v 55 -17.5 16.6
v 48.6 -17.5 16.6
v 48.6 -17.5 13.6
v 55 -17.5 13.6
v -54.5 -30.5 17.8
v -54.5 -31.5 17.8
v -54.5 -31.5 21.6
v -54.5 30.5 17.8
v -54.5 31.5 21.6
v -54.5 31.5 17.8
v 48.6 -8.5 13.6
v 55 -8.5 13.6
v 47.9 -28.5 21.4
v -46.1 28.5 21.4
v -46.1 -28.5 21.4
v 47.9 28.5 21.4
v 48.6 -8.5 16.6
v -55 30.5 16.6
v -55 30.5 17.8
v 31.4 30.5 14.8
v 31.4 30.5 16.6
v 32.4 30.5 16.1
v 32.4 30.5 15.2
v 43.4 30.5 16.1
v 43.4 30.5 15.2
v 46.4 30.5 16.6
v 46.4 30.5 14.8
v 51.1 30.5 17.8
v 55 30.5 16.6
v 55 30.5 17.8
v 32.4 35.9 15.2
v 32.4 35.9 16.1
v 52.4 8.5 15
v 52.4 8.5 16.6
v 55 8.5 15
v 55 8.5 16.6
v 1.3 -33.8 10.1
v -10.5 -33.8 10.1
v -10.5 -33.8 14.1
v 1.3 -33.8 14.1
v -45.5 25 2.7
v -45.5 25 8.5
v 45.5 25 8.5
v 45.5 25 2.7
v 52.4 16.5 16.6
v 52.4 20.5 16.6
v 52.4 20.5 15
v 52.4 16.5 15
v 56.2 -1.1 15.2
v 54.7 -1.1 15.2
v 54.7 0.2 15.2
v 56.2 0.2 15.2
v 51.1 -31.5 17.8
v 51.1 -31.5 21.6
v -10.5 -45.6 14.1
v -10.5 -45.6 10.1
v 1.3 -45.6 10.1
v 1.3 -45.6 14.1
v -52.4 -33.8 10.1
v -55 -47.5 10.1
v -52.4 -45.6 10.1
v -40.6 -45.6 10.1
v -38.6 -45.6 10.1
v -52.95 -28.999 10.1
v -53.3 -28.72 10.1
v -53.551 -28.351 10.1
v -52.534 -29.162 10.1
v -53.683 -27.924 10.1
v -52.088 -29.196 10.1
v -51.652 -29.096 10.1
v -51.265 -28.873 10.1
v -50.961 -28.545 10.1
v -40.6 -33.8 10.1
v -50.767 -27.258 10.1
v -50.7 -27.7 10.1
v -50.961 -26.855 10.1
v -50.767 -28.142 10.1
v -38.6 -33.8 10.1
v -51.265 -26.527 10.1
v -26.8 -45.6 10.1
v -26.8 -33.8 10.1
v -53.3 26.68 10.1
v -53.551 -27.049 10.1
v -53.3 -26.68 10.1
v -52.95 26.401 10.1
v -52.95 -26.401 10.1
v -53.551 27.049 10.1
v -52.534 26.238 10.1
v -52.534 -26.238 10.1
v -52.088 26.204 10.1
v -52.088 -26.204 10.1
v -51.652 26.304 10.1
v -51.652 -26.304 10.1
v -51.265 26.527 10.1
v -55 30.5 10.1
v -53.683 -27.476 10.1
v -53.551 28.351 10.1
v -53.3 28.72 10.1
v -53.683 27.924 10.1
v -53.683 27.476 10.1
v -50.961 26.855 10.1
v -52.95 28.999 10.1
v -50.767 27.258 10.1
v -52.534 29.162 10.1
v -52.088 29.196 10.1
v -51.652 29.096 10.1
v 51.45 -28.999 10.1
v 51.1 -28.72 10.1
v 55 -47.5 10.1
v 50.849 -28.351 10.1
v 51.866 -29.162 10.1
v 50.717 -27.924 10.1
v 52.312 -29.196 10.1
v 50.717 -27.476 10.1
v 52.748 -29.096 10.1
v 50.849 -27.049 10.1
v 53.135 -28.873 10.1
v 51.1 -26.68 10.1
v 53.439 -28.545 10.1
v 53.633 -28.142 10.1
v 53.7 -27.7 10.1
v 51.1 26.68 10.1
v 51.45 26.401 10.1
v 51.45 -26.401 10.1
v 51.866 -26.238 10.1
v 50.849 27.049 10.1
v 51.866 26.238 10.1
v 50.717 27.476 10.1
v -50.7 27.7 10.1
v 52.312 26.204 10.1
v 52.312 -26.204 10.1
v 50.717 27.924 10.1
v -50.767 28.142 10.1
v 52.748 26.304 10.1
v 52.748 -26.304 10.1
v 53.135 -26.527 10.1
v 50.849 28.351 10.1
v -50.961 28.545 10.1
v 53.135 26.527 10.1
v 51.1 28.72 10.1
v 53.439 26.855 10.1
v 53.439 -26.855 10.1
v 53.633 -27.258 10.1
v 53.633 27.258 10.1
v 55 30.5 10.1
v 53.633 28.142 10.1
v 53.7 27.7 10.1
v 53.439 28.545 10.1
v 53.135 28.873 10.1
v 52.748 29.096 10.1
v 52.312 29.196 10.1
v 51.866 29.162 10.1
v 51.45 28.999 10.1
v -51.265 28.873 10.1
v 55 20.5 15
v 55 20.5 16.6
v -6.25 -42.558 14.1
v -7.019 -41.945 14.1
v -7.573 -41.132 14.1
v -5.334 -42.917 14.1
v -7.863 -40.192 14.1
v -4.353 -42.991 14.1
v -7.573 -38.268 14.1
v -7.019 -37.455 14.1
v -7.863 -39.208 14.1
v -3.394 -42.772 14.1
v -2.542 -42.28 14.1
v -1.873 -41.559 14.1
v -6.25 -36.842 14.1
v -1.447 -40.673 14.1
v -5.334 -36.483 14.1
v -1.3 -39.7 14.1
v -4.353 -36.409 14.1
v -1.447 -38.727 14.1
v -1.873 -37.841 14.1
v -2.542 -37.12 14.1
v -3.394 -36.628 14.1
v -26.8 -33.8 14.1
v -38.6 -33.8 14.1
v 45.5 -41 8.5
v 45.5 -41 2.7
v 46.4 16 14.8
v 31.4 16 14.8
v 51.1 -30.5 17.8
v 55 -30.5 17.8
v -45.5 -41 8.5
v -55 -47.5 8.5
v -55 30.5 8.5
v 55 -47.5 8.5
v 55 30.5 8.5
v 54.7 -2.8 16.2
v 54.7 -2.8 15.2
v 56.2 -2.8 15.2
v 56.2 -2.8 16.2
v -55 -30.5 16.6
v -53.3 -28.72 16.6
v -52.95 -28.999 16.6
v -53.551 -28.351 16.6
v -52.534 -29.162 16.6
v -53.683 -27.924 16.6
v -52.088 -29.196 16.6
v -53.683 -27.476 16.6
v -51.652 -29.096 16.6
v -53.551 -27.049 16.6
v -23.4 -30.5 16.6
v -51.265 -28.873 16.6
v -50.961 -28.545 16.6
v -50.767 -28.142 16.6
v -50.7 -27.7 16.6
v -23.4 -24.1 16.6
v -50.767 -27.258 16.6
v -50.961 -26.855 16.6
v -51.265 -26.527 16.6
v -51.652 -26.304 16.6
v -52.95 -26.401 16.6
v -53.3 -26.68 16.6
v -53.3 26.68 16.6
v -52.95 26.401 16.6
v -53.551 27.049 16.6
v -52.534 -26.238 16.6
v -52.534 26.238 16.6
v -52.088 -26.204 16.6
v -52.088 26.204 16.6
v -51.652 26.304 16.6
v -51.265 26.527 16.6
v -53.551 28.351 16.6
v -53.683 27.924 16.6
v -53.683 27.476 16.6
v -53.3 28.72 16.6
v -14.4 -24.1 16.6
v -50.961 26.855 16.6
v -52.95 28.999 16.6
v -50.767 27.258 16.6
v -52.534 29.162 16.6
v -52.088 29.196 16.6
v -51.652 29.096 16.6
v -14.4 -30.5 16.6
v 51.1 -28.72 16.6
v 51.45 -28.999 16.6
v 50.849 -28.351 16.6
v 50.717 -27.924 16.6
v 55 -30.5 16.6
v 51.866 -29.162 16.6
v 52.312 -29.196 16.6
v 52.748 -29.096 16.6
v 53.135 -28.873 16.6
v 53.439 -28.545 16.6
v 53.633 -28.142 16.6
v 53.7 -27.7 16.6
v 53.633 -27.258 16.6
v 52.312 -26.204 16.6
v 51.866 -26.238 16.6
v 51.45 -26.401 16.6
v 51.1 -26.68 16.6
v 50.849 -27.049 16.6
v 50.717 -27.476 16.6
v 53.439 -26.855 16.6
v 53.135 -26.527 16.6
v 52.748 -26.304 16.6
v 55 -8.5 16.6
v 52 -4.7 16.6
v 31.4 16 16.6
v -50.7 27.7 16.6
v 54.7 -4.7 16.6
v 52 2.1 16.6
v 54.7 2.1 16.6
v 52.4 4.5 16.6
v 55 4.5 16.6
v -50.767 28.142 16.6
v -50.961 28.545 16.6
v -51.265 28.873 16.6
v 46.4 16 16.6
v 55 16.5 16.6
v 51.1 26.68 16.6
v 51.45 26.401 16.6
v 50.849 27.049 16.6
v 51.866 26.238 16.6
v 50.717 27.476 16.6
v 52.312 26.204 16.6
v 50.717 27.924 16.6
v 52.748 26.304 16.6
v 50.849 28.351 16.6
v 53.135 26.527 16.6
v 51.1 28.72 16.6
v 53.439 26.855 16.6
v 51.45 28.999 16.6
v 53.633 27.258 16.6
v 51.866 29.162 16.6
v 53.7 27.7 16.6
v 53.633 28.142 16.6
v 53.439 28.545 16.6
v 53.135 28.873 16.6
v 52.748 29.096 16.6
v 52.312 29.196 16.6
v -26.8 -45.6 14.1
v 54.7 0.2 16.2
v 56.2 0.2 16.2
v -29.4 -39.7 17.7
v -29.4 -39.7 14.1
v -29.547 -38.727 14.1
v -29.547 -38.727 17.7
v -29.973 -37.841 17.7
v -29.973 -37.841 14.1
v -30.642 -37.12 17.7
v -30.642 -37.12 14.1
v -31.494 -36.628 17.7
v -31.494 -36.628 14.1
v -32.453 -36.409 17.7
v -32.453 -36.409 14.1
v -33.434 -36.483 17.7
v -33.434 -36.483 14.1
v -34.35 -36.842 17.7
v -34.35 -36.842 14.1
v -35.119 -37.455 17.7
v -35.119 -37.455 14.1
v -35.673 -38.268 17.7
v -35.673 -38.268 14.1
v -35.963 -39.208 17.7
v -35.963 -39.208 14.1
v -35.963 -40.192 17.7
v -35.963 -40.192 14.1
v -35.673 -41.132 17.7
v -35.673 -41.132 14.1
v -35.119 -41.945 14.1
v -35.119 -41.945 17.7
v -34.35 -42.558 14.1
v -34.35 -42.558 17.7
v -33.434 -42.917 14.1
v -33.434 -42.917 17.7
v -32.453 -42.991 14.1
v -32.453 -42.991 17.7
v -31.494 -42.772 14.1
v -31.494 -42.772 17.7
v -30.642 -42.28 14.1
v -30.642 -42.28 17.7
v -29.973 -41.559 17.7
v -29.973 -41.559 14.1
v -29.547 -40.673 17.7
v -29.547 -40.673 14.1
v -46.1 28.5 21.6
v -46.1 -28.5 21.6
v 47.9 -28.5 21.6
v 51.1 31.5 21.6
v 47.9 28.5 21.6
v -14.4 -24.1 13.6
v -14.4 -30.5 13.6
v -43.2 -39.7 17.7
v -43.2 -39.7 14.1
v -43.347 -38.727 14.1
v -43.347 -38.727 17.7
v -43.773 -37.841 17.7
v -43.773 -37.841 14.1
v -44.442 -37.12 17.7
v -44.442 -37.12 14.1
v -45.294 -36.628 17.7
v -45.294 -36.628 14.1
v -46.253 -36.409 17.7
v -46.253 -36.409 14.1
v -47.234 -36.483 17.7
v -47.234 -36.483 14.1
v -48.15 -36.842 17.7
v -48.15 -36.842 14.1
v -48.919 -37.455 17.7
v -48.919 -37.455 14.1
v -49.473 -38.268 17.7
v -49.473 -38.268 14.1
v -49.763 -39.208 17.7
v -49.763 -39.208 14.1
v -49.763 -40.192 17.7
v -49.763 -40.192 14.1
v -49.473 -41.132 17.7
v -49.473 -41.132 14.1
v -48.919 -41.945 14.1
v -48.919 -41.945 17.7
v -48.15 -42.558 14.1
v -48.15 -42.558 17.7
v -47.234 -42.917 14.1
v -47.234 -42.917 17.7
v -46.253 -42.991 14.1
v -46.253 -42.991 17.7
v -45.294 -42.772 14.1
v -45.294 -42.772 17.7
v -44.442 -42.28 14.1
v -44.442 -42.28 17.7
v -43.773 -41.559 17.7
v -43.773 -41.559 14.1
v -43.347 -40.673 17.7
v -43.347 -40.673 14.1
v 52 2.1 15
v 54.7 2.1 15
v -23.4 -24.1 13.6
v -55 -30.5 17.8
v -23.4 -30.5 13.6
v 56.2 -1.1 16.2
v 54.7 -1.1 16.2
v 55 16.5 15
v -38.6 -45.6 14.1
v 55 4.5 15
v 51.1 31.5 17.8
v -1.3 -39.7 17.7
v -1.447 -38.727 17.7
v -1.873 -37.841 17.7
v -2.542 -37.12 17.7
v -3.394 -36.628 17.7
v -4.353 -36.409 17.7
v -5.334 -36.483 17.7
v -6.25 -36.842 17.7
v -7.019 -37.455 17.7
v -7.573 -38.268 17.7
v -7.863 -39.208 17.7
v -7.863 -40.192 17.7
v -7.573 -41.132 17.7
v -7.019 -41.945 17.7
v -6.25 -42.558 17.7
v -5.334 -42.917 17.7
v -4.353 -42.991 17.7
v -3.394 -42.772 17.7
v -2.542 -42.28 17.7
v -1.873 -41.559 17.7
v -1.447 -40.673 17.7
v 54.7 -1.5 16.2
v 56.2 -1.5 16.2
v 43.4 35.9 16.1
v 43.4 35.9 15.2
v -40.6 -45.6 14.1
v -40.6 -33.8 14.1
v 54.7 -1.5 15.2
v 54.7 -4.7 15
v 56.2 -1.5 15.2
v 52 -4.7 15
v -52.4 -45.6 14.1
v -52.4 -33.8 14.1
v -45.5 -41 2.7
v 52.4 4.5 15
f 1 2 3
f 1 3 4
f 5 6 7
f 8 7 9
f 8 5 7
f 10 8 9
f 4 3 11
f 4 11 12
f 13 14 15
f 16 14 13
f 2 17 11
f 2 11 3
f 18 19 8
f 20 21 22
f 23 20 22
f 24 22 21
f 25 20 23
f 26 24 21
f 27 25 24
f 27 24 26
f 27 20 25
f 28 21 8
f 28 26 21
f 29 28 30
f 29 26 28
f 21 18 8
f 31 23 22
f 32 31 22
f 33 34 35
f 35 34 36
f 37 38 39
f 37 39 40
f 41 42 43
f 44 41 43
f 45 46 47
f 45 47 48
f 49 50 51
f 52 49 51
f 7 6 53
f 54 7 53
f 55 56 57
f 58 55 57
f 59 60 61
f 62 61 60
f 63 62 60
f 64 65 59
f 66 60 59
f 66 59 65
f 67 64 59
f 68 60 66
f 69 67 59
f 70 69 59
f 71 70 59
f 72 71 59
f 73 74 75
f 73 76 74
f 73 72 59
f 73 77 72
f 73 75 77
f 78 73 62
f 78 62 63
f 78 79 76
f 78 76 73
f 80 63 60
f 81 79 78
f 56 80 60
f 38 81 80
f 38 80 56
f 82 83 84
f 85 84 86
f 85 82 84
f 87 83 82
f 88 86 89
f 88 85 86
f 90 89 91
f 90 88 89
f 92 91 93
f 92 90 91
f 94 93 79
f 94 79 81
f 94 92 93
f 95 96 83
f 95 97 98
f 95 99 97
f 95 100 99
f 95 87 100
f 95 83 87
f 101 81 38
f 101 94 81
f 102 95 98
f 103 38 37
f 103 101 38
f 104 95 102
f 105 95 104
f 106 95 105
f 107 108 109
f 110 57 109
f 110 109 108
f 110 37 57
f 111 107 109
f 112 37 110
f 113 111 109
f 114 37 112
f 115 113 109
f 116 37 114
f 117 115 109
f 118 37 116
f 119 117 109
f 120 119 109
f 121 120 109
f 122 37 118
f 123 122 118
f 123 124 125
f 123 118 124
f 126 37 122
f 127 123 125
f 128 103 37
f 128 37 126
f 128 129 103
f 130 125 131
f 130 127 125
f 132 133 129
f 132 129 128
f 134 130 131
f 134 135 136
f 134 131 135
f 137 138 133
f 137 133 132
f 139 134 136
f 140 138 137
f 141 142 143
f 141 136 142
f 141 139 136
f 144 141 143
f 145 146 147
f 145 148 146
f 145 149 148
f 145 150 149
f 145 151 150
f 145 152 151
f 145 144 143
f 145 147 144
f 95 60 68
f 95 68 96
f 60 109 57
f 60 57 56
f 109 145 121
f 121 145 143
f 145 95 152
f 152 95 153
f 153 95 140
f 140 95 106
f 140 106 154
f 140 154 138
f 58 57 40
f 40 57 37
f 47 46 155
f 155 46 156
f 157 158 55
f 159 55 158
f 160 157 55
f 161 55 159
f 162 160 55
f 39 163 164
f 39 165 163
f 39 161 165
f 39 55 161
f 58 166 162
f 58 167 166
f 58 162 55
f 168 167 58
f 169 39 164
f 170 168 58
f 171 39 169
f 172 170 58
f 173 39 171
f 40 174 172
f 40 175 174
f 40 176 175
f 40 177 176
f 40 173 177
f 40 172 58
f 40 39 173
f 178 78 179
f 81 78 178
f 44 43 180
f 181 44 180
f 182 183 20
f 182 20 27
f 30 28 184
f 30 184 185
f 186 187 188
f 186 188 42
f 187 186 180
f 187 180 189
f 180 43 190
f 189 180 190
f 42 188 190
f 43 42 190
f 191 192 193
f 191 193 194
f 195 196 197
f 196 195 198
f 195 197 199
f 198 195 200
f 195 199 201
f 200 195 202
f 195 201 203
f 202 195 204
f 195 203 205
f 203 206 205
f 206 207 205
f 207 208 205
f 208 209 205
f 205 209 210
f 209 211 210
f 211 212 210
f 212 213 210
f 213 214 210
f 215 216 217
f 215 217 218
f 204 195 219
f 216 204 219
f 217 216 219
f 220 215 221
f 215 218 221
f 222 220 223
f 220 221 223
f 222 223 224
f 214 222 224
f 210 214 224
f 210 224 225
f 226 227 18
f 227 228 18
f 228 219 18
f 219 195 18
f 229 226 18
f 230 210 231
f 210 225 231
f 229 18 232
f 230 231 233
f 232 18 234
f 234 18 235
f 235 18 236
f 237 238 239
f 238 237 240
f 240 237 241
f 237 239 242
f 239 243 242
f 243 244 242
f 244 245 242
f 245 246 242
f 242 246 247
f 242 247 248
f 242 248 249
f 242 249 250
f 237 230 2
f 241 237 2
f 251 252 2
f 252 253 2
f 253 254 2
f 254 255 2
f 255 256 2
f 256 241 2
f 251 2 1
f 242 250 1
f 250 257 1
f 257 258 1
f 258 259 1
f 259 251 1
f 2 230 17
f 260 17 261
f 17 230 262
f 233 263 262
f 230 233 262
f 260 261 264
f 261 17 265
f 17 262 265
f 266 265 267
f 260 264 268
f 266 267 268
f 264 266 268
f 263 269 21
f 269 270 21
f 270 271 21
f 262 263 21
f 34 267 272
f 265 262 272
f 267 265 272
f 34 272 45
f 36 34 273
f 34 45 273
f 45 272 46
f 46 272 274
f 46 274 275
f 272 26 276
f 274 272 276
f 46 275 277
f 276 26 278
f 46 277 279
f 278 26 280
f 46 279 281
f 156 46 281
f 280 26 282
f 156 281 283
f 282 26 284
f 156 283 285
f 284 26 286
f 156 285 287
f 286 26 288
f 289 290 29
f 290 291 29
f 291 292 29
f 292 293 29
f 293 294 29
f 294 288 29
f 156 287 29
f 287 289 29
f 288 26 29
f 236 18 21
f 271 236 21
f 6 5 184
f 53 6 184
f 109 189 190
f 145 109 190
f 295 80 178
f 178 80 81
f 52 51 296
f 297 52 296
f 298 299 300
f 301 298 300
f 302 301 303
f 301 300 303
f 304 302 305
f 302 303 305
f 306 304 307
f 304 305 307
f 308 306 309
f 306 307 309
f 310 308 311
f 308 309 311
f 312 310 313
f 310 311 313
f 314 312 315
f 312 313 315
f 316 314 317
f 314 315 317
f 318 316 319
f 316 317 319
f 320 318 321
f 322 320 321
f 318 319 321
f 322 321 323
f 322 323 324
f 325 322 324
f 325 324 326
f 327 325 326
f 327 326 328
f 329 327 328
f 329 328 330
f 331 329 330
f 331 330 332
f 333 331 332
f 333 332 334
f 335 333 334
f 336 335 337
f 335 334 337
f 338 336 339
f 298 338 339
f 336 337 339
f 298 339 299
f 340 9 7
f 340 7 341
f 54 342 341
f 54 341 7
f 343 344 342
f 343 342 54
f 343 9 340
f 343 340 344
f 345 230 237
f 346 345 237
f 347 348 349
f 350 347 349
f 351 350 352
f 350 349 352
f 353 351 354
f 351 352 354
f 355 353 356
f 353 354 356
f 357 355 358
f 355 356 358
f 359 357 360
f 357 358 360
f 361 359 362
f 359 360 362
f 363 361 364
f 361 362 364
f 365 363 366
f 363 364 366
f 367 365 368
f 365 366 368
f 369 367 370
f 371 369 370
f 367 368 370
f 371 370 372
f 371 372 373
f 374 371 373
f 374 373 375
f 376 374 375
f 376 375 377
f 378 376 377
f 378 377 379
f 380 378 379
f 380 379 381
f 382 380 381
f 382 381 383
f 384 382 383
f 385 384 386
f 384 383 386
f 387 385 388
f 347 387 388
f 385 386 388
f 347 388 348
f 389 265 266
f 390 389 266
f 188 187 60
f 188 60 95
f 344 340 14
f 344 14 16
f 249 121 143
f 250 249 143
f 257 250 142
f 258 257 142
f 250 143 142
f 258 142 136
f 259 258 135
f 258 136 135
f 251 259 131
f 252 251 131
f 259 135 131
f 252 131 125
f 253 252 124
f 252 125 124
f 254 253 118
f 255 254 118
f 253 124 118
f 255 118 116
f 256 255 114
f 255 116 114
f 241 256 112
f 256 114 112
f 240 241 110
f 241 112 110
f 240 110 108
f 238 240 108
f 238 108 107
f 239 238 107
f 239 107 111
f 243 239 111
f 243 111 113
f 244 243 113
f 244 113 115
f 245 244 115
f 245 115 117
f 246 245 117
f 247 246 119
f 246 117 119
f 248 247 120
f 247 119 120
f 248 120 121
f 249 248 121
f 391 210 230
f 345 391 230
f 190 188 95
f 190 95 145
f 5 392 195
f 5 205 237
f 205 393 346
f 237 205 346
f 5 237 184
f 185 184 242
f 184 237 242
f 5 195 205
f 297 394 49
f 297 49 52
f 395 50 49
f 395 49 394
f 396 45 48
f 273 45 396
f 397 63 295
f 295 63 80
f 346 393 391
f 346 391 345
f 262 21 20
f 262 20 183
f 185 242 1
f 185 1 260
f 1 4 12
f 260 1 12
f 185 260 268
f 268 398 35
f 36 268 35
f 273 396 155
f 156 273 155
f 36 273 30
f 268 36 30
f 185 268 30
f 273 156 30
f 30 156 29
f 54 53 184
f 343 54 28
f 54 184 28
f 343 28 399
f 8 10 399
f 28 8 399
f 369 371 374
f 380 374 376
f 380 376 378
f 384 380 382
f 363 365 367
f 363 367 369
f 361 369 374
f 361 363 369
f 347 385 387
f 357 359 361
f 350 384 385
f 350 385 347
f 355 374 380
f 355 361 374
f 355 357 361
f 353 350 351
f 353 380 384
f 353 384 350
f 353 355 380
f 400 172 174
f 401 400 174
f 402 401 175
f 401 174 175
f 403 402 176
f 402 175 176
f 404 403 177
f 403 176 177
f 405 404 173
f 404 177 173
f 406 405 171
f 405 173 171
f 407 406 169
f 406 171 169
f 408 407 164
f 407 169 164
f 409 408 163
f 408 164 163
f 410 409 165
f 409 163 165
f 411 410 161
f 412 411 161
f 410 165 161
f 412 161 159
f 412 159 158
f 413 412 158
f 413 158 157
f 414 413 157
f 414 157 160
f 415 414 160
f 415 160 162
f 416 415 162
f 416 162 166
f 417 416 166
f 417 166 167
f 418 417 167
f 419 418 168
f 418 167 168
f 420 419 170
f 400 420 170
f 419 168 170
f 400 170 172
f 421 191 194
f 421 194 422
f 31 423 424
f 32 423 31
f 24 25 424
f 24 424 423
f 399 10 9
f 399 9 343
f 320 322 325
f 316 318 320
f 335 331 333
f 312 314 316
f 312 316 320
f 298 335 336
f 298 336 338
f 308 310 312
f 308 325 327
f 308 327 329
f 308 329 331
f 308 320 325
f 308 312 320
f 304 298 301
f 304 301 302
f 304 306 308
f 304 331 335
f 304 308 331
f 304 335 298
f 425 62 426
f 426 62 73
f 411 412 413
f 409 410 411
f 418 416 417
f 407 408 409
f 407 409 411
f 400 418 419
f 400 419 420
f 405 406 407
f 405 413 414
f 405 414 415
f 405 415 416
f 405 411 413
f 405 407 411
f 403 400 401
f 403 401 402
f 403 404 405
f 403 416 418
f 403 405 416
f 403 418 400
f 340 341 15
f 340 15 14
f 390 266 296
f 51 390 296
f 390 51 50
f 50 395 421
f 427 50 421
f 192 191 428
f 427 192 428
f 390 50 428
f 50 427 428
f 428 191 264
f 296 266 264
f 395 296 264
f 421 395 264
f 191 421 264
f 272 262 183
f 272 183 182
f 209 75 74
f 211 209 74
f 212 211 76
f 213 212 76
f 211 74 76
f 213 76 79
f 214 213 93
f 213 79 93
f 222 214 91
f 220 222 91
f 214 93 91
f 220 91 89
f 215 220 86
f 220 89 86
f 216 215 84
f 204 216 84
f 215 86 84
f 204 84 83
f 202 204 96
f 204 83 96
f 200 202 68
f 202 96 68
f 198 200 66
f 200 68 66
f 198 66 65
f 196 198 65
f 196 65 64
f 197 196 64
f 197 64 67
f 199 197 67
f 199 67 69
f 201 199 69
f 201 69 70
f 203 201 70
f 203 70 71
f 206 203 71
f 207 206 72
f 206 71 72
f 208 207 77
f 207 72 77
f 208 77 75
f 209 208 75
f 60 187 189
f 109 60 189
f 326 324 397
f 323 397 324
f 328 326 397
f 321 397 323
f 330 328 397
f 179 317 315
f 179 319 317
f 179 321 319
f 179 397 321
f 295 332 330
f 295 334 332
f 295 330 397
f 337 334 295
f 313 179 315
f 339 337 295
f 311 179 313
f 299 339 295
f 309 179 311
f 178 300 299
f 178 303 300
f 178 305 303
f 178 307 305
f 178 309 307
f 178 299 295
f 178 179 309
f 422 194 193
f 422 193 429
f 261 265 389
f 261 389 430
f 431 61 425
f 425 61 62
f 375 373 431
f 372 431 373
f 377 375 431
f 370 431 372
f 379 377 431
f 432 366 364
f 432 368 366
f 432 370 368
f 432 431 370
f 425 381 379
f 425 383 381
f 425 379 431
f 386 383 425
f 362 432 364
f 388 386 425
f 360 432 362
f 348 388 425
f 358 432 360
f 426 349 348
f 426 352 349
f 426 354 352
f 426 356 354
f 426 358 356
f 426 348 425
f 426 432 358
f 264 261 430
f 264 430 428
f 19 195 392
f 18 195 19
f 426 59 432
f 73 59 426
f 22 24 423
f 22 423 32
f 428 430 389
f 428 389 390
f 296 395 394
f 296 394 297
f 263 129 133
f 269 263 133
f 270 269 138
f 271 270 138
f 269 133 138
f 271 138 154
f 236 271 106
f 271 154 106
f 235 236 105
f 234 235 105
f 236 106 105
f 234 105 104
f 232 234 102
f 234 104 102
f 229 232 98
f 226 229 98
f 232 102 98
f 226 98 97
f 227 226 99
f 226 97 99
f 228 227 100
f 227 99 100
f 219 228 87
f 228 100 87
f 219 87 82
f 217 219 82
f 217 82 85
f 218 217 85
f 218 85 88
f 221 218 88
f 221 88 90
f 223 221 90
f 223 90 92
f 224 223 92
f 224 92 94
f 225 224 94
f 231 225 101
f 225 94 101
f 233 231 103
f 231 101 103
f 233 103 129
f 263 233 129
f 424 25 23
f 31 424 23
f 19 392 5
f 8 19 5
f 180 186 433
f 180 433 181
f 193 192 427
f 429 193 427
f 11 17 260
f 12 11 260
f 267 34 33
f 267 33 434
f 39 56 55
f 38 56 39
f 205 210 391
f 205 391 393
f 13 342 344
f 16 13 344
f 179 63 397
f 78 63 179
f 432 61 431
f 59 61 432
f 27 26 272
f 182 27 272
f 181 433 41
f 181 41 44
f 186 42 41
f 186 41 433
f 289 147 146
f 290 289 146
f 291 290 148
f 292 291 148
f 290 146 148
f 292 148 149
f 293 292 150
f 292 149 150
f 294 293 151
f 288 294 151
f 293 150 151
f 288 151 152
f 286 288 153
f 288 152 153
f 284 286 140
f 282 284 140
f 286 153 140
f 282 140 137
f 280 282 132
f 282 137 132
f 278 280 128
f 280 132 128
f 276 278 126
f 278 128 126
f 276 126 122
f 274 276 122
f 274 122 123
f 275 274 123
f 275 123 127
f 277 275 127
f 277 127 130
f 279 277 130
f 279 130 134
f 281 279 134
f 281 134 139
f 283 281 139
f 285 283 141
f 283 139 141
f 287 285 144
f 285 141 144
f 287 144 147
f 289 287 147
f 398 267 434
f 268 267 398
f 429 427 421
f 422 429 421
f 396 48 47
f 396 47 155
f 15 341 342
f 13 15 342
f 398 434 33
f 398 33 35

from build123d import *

# Parameters (mm, degrees)
SKETCH001_W   = 110
SKETCH001_H   = 78
PAD_DEPTH     = 1.6
SKETCH009_R   = 1.5
PAD001_DEPTH  = 6.5
SKETCH010_W   = 110
SKETCH010_H   = 61
PAD002_DEPTH  = 1.2
SKETCH011_W   = 105.6
SKETCH011_H   = 63
PAD003_DEPTH  = 3.8
SKETCH012_W   = 94
SKETCH012_H   = 57
POCKET_DEPTH  = 0.2
SKETCH013_W   = 9
SKETCH013_H   = 6.4
SKETCH013_W_2 = 6.4
SKETCH013_H_2 = 9
PAD004_DEPTH  = 3
SKETCH014_W   = 15
SKETCH014_H   = 14.5
PAD005_DEPTH  = 1.8
SKETCH015_W   = 11
SKETCH015_H   = 0.9
PAD006_DEPTH  = 5.4
SKETCH016_W   = 2.7
SKETCH016_H   = 6.8
SKETCH016_W_2 = 2.6
SKETCH016_H_2 = 4
PAD007_DEPTH  = 1.6
SKETCH017_W   = 1.3
SKETCH017_H   = 1
PAD008_DEPTH  = 1.5
SKETCH018_W   = 11.8
SKETCH018_H   = 11.8
PAD009_DEPTH  = 4
SKETCH019_R   = 3.3
PAD010_DEPTH  = 3.6
SKETCH020_W   = 91
SKETCH020_H   = 66
PAD011_DEPTH  = 5.8


with BuildPart() as part:
    # Sketch001 → Pad (new body)
    with BuildSketch(Plane.XY):
        with Locations((0, -8.5)):
            Rectangle(SKETCH001_W, SKETCH001_H)
    extrude(amount=PAD_DEPTH)

    # Sketch009 (on Face6 of Pad) → Pad001 (join)
    with BuildSketch(Plane.XY.offset(1.6)):
        with Locations((-52.2, 27.7)):
            Circle(SKETCH009_R)
        with Locations((-52.2, -27.7)):
            Circle(SKETCH009_R)
        with Locations((52.2, -27.7)):
            Circle(SKETCH009_R)
        with Locations((52.2, 27.7)):
            Circle(SKETCH009_R)
    extrude(amount=PAD001_DEPTH)

    # Sketch010 (on Face12 of Pad001) → Pad002 (join)
    with BuildSketch(Plane.XY.offset(8.1)):
        Rectangle(SKETCH010_W, SKETCH010_H)
    extrude(amount=PAD002_DEPTH)

    # Sketch011 (on Face5 of Pad002) → Pad003 (join)
    with BuildSketch(Plane.XY.offset(9.3)):
        with Locations((-1.7, 0)):
            Rectangle(SKETCH011_W, SKETCH011_H)
    extrude(amount=PAD003_DEPTH)

    # Sketch012 (on Face19 of Pad003) → Pocket (cut)
    with BuildSketch(Plane.XY.offset(13.1)):
        with Locations((0.9, 0)):
            Rectangle(SKETCH012_W, SKETCH012_H)
    extrude(amount=-POCKET_DEPTH, mode=Mode.SUBTRACT)

    # Sketch013 (on Face4 of Pocket) → Pad004 (join)
    with BuildSketch(Plane(origin=(0, 0, 8.1), x_dir=(1, 0, 0), z_dir=(0, 0, -1))):
        with Locations((-18.9, 27.3)):
            Rectangle(SKETCH013_W, SKETCH013_H)
        with Locations((51.8, 13)):
            Rectangle(SKETCH013_W_2, SKETCH013_H_2)
    extrude(amount=PAD004_DEPTH)

    # Sketch014 (on Face4 of Pad004) → Pad005 (join)
    with BuildSketch(Plane(origin=(0, 0, 8.1), x_dir=(1, 0, 0), z_dir=(0, 0, -1))):
        with Locations((38.9, -23.25)):
            Rectangle(SKETCH014_W, SKETCH014_H)
    extrude(amount=PAD005_DEPTH)

    # Sketch015 (on Face5 of Pad005) → Pad006 (join)
    with BuildSketch(Plane(origin=(0, 30.5, 0), x_dir=(-1, 0, 0), z_dir=(0, 1, 0))):
        with Locations((-37.9, 7.15)):
            Rectangle(SKETCH015_W, SKETCH015_H)
    extrude(amount=PAD006_DEPTH)

    # Sketch016 (on Face4 of Pad006) → Pad007 (join)
    with BuildSketch(Plane(origin=(0, 0, 8.1), x_dir=(1, 0, 0), z_dir=(0, 0, -1))):
        with Locations((53.35, 1.3)):
            Rectangle(SKETCH016_W, SKETCH016_H)
        with Locations((53.7, -6.5)):
            Rectangle(SKETCH016_W_2, SKETCH016_H_2)
        with Locations((53.7, -18.5)):
            Rectangle(SKETCH016_W_2, SKETCH016_H_2)
    extrude(amount=PAD007_DEPTH)

    # Sketch017 (on Face31 of Pad007) → Pad008 (join)
    with BuildSketch(Plane.YZ.offset(54.7)):
        with Locations((-2.15, 7.2)):
            Rectangle(SKETCH017_W, SKETCH017_H)
        with Locations((-0.45, 7.2)):
            Rectangle(SKETCH017_W, SKETCH017_H)
    extrude(amount=PAD008_DEPTH)

    # Sketch018 (on Face50 of Pad008) → Pad009 (join)
    with BuildSketch(Plane.XY.offset(1.6)):
        with Locations((-4.6, -39.7)):
            Rectangle(SKETCH018_W, SKETCH018_H)
        with Locations((-32.7, -39.7)):
            Rectangle(SKETCH018_W, SKETCH018_H)
        with Locations((-46.5, -39.7)):
            Rectangle(SKETCH018_W, SKETCH018_H)
    extrude(amount=PAD009_DEPTH)

    # Sketch019 (on Face87 of Pad009) → Pad010 (join)
    with BuildSketch(Plane.XY.offset(5.6)):
        with Locations((-46.5, -39.7)):
            Circle(SKETCH019_R)
        with Locations((-32.7, -39.7)):
            Circle(SKETCH019_R)
        with Locations((-4.6, -39.7)):
            Circle(SKETCH019_R)
    extrude(amount=PAD010_DEPTH)

    # Sketch020 (on Face85 of Pad010) → Pad011 (join)
    with BuildSketch(Plane(origin=(0, 0, 0), x_dir=(1, 0, 0), z_dir=(0, 0, -1))):
        with Locations((0, 8)):
            Rectangle(SKETCH020_W, SKETCH020_H)
    extrude(amount=PAD011_DEPTH)


with BuildPart() as part_1:
    # Body001 placement: moved
    add(part.part.moved(Location((0, 0, 8.5))))


solid = part_1.part
